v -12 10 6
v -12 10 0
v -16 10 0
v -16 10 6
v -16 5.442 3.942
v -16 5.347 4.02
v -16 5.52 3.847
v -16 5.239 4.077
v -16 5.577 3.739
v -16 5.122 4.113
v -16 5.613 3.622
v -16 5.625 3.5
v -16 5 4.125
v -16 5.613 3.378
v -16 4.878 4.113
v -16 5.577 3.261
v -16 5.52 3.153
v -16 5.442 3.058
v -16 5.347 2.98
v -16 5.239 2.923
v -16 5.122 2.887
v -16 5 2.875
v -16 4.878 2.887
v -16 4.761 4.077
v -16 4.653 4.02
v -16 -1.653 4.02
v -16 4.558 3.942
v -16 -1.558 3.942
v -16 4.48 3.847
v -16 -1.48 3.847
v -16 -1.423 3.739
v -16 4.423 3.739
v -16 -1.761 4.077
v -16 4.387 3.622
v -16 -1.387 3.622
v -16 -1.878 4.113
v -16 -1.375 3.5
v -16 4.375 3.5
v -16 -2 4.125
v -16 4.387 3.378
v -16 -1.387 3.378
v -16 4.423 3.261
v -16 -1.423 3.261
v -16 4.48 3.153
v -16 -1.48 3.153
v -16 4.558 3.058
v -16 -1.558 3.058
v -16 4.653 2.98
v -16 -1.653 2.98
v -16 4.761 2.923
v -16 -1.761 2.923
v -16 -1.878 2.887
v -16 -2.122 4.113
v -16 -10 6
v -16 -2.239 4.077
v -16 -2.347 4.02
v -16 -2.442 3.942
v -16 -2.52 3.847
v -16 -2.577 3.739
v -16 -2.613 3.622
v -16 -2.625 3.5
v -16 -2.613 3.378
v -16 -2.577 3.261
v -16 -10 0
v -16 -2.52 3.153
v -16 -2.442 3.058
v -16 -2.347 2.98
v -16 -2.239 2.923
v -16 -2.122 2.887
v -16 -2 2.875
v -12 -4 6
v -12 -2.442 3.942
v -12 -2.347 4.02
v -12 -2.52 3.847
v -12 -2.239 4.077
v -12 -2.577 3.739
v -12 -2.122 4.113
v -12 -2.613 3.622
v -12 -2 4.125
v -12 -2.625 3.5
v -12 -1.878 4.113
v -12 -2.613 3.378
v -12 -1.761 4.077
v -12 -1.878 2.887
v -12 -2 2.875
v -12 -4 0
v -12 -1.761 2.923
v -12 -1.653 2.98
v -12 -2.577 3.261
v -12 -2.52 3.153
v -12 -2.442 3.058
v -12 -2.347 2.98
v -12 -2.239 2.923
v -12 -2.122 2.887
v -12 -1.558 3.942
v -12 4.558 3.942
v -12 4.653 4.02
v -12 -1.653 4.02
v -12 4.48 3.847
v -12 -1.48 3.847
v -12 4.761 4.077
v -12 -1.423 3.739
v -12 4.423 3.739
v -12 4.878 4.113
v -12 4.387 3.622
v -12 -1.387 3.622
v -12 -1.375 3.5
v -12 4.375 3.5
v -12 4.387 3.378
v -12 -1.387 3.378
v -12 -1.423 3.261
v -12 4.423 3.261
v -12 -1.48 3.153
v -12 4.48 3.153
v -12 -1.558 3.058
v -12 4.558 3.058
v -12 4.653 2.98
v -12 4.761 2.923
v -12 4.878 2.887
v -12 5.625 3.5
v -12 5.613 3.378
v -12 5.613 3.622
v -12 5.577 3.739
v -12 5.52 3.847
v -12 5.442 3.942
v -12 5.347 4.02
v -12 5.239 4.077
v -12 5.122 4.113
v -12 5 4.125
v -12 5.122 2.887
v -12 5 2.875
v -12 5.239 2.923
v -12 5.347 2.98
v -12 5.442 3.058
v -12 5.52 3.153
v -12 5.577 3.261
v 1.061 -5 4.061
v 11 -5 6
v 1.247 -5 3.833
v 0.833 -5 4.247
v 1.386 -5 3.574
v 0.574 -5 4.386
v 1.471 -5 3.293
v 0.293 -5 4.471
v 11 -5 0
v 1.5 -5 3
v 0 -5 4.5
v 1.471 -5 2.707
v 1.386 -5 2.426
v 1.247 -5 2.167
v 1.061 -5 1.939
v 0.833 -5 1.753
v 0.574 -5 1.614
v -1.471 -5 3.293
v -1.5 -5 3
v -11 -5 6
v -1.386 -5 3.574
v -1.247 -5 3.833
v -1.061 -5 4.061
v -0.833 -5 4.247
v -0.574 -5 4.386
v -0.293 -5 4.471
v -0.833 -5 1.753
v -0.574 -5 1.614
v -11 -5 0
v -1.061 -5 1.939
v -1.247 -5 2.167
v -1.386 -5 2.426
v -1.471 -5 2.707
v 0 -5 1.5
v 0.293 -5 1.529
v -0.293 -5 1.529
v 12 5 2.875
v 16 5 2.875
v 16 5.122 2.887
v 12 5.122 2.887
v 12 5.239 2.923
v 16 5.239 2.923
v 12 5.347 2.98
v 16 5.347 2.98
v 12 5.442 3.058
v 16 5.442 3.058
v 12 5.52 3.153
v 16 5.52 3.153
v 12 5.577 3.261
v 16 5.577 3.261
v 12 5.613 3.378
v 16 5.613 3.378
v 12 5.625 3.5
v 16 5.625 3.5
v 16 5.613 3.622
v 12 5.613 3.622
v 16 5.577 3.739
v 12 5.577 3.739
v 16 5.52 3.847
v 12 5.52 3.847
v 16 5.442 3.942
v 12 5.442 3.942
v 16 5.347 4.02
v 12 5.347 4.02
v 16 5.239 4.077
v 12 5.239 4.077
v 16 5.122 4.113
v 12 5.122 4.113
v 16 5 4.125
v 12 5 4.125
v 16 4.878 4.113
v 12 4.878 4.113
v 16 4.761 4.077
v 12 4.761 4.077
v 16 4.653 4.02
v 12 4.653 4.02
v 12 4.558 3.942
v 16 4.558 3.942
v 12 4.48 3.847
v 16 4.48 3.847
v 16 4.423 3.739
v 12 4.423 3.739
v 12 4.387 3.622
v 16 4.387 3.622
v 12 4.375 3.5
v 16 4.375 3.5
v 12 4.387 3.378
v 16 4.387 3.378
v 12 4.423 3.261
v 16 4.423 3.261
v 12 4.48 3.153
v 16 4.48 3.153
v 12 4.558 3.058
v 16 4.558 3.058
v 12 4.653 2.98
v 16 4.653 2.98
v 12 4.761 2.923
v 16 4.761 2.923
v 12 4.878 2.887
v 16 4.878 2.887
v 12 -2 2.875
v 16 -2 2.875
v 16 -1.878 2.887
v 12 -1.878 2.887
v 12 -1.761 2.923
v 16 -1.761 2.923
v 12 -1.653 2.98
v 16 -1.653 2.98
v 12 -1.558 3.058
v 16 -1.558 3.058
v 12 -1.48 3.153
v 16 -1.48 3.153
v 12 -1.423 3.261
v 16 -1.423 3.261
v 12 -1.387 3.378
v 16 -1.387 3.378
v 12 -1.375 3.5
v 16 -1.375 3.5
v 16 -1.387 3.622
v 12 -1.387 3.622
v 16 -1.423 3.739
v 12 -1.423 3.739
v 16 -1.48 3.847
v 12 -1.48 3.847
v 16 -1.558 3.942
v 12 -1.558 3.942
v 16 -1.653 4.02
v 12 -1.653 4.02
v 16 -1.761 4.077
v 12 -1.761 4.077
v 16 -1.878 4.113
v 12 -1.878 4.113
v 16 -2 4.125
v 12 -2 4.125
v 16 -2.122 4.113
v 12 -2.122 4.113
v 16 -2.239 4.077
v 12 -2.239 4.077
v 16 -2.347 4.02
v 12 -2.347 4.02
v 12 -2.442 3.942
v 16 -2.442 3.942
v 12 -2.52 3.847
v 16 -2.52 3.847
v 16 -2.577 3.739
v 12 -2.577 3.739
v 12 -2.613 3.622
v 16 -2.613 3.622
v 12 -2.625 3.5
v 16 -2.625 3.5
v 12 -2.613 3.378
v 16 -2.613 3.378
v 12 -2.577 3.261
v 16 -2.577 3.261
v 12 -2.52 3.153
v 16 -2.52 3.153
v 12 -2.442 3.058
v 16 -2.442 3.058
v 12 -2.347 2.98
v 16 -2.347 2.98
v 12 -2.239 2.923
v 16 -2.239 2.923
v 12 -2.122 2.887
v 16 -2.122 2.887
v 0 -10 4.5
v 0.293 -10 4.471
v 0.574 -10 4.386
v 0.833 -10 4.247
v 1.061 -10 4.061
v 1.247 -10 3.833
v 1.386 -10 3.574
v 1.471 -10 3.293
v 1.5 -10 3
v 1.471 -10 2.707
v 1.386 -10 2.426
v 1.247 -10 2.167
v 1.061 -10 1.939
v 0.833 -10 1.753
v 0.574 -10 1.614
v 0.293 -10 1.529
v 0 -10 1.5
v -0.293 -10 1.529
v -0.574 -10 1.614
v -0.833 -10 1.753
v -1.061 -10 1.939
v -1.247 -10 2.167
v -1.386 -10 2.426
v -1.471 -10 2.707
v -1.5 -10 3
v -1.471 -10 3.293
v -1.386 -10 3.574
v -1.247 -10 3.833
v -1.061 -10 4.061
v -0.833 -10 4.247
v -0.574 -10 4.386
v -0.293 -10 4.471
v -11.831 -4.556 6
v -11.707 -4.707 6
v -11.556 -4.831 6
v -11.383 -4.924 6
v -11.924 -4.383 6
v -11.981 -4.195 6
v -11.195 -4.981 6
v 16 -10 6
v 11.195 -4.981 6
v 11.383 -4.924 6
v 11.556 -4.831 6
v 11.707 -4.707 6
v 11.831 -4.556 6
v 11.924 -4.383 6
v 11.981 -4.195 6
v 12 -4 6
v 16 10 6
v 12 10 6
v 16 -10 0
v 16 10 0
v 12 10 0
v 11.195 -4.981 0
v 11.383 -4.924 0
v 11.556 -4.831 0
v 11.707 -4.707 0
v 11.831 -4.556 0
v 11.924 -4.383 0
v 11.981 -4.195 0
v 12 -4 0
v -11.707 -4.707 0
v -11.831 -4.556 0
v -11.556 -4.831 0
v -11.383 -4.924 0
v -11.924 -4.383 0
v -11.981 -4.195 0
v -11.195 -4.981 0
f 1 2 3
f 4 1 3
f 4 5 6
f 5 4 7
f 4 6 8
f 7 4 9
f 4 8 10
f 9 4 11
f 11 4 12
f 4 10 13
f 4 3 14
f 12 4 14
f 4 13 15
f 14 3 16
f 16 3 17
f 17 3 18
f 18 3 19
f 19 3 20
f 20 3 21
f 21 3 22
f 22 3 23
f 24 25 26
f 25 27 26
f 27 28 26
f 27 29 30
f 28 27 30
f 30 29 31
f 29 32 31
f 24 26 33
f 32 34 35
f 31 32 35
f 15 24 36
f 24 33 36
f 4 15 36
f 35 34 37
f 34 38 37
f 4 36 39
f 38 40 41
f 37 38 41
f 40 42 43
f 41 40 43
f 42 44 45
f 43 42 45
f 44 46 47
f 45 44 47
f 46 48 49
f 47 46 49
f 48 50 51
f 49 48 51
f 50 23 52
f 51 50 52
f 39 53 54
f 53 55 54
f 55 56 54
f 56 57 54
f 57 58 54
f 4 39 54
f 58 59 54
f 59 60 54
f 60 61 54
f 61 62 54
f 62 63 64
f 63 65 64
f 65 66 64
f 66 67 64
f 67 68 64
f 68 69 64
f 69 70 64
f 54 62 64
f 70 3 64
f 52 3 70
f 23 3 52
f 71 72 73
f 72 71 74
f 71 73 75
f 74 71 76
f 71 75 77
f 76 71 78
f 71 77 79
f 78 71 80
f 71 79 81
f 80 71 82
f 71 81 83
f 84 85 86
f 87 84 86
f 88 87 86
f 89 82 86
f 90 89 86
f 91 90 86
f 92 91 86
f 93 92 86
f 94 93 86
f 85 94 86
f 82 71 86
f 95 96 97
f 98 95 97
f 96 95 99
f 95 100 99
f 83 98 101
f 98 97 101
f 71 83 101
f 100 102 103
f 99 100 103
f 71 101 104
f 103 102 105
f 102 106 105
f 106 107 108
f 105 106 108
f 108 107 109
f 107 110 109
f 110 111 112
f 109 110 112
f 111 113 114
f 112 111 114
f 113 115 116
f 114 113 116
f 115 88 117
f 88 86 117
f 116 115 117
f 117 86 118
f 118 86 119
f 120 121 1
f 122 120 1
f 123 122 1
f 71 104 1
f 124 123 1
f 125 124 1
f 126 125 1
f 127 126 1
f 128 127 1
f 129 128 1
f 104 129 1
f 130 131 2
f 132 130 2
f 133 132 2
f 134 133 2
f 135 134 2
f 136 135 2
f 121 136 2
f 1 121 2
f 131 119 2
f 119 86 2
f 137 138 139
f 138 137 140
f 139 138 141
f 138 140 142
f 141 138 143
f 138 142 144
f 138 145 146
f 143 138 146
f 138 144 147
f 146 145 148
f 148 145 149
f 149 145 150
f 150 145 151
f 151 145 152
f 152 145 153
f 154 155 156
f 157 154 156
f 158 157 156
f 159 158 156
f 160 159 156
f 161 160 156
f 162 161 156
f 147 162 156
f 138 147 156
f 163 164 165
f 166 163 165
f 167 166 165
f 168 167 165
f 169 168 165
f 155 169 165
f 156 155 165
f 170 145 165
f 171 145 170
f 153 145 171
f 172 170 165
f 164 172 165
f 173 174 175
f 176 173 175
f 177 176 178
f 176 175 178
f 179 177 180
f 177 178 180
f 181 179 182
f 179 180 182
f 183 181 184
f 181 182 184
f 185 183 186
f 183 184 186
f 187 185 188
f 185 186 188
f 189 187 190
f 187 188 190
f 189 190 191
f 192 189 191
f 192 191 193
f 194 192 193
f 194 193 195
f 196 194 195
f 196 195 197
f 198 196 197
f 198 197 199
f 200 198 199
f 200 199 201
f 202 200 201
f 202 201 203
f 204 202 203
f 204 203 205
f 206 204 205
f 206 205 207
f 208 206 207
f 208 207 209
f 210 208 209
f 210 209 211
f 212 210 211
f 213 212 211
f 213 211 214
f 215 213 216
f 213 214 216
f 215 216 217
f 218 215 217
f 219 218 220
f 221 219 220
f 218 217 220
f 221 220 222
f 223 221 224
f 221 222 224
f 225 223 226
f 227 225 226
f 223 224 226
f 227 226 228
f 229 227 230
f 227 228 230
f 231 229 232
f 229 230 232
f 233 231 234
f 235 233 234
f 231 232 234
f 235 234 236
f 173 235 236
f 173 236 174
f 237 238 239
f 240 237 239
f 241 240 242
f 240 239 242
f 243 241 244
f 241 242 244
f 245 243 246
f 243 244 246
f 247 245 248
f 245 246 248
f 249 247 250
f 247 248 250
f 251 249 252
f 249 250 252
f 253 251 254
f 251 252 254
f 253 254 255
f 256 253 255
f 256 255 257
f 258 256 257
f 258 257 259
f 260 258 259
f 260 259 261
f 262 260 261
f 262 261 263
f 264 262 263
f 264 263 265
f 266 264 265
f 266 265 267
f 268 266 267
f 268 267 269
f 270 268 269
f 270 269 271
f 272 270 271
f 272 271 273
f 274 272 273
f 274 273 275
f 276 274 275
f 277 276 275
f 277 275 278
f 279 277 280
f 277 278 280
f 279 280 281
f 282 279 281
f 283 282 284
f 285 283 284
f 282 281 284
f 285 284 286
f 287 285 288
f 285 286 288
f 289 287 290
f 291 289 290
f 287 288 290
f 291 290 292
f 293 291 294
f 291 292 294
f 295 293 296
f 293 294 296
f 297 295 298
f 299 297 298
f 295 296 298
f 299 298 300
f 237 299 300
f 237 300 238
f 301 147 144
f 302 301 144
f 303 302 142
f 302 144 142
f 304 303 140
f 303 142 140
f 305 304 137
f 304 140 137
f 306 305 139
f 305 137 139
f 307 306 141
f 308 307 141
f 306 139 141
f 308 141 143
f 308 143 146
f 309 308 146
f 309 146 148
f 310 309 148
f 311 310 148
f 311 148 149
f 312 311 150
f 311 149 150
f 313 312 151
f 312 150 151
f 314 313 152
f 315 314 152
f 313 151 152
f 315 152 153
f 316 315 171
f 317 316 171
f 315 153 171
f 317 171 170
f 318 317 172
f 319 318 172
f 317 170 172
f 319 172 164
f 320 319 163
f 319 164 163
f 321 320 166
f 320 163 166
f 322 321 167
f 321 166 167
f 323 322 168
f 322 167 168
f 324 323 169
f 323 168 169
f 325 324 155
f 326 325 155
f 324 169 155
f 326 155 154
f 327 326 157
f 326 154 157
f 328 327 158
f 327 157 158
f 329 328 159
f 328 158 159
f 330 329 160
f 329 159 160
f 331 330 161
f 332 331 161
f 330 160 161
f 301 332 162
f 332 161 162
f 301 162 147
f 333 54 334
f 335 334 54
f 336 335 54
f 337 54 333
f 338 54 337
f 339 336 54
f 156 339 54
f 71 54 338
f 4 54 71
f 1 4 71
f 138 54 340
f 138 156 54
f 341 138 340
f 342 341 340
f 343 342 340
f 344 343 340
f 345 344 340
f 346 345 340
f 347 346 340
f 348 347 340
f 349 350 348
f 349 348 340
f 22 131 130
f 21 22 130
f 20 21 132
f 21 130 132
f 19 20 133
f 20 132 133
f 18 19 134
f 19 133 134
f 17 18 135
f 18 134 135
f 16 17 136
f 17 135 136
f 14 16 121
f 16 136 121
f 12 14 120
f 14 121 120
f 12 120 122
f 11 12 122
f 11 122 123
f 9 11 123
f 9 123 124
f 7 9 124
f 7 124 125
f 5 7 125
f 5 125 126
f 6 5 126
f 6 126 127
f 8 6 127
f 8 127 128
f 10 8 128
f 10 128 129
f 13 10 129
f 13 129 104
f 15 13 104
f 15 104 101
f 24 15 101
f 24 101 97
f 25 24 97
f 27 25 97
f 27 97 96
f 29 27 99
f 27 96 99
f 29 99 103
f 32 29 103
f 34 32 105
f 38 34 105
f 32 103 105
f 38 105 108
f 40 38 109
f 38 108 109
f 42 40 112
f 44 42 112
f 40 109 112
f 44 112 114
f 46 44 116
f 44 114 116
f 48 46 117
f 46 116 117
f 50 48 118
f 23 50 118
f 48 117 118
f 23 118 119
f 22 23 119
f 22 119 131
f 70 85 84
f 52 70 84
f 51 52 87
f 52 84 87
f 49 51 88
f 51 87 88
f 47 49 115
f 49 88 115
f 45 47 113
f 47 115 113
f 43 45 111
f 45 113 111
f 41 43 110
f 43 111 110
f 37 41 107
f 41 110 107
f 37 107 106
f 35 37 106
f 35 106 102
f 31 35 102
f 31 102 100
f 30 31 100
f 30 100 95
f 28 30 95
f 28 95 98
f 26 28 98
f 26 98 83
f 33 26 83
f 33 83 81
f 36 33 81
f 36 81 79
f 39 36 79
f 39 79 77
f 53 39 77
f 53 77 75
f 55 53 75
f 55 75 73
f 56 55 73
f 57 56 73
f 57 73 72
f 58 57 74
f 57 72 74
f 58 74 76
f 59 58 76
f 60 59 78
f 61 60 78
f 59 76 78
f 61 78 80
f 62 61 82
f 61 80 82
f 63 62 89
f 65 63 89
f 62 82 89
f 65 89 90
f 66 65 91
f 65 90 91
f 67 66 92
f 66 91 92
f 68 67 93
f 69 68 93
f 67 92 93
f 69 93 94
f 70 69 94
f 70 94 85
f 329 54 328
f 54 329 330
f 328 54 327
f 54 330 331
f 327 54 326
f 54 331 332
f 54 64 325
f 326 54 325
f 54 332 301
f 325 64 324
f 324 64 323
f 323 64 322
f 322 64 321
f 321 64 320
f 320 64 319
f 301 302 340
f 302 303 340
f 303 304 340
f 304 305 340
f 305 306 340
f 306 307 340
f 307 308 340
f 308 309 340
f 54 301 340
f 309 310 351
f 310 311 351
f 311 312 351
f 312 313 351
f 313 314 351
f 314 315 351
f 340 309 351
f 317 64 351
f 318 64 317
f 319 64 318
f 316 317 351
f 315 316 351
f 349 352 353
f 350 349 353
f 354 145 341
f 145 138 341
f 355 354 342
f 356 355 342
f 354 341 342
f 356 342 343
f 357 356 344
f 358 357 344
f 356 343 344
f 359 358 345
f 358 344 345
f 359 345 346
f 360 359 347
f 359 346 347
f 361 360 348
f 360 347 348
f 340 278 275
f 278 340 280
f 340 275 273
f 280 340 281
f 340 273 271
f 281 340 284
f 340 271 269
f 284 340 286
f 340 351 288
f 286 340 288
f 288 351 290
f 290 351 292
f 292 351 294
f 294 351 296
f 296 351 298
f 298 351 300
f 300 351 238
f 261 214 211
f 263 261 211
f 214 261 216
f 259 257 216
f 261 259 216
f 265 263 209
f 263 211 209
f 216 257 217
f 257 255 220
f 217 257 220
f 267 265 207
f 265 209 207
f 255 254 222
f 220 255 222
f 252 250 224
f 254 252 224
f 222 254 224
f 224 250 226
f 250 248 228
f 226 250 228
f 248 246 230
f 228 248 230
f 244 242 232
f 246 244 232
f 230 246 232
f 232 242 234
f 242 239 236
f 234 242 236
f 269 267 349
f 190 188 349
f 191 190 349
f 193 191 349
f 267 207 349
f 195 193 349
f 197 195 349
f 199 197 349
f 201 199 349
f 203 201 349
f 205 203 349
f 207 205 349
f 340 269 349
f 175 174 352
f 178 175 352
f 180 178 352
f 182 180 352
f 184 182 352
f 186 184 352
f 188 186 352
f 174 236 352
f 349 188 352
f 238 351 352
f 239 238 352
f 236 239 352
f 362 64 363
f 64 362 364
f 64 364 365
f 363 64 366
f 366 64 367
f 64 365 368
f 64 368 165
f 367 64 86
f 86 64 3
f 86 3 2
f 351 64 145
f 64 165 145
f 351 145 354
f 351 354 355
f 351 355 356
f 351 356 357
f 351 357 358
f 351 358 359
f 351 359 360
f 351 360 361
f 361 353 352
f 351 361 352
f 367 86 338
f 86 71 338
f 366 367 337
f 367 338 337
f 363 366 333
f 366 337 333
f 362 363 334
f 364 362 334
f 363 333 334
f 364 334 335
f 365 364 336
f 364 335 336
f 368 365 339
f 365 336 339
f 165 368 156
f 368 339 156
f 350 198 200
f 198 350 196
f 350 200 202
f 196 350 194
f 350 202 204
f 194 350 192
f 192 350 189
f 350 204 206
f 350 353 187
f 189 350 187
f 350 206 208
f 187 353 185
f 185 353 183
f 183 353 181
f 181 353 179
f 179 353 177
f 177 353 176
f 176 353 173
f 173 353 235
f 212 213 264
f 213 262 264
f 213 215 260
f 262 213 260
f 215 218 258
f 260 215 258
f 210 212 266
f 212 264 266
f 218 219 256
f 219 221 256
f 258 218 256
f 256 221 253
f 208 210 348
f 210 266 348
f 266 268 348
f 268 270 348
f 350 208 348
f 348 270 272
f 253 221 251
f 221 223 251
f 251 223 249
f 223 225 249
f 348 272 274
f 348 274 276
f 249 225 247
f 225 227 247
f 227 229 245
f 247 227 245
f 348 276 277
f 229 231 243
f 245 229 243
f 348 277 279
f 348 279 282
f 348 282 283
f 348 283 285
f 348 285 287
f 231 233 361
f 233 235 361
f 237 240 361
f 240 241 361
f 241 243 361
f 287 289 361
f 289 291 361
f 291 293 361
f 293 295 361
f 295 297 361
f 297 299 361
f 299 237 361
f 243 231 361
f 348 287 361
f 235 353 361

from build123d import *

# Parameters (mm, degrees)
BOSS_EXTRU_1_DEPTH      = 6
ESQUISSE2_R             = 1.5
ENL_V_MAT_EXTRU_1_DEPTH = 5
ESQUISSE3_R             = 0.625
ENL_V_MAT_EXTRU_2_DEPTH = 35.058772732
CONG_2_R                = 1
CONG_3_R                = 1


with BuildPart() as part:
    # Esquisse1 → Boss.-Extru.1 (new body)
    with BuildSketch(Plane.XY):
        Polygon((-12, 10), (-16, 10), (-16, -10), (16, -10), (16, 10), (12, 10), (12, -5), (-12, -5), align=None)
    extrude(amount=BOSS_EXTRU_1_DEPTH)

    # Esquisse2 → Enlèv. mat.-Extru.1 (cut)
    with BuildSketch(Plane(origin=(0, -5, 0), x_dir=(1, 0, 0), z_dir=(0, 1, 0))):
        with Locations(Location((0, -3, 0), (0, 0, 270))):
            Circle(ESQUISSE2_R)
    extrude(amount=-ENL_V_MAT_EXTRU_1_DEPTH, mode=Mode.SUBTRACT)

    # Esquisse3 → Enlèv. mat.-Extru.2 (cut, through all)
    with BuildSketch(Plane(origin=(16, 0, 0), x_dir=(0, 0, -1), z_dir=(1, 0, 0))):
        with Locations((-3.5, 5)):
            Circle(ESQUISSE3_R)
        with Locations((-3.5, -2)):
            Circle(ESQUISSE3_R)
    extrude(amount=-ENL_V_MAT_EXTRU_2_DEPTH, mode=Mode.SUBTRACT)

    # Congé2
    cong_2_edges = [part.edges().sort_by_distance(p)[0] for p in [
        (-12, -5, 3),
    ]]
    fillet(cong_2_edges, radius=CONG_2_R)

    # Congé3
    cong_3_edges = [part.edges().sort_by_distance(p)[0] for p in [
        (12, -5, 3),
    ]]
    fillet(cong_3_edges, radius=CONG_3_R)


solid = part.part
